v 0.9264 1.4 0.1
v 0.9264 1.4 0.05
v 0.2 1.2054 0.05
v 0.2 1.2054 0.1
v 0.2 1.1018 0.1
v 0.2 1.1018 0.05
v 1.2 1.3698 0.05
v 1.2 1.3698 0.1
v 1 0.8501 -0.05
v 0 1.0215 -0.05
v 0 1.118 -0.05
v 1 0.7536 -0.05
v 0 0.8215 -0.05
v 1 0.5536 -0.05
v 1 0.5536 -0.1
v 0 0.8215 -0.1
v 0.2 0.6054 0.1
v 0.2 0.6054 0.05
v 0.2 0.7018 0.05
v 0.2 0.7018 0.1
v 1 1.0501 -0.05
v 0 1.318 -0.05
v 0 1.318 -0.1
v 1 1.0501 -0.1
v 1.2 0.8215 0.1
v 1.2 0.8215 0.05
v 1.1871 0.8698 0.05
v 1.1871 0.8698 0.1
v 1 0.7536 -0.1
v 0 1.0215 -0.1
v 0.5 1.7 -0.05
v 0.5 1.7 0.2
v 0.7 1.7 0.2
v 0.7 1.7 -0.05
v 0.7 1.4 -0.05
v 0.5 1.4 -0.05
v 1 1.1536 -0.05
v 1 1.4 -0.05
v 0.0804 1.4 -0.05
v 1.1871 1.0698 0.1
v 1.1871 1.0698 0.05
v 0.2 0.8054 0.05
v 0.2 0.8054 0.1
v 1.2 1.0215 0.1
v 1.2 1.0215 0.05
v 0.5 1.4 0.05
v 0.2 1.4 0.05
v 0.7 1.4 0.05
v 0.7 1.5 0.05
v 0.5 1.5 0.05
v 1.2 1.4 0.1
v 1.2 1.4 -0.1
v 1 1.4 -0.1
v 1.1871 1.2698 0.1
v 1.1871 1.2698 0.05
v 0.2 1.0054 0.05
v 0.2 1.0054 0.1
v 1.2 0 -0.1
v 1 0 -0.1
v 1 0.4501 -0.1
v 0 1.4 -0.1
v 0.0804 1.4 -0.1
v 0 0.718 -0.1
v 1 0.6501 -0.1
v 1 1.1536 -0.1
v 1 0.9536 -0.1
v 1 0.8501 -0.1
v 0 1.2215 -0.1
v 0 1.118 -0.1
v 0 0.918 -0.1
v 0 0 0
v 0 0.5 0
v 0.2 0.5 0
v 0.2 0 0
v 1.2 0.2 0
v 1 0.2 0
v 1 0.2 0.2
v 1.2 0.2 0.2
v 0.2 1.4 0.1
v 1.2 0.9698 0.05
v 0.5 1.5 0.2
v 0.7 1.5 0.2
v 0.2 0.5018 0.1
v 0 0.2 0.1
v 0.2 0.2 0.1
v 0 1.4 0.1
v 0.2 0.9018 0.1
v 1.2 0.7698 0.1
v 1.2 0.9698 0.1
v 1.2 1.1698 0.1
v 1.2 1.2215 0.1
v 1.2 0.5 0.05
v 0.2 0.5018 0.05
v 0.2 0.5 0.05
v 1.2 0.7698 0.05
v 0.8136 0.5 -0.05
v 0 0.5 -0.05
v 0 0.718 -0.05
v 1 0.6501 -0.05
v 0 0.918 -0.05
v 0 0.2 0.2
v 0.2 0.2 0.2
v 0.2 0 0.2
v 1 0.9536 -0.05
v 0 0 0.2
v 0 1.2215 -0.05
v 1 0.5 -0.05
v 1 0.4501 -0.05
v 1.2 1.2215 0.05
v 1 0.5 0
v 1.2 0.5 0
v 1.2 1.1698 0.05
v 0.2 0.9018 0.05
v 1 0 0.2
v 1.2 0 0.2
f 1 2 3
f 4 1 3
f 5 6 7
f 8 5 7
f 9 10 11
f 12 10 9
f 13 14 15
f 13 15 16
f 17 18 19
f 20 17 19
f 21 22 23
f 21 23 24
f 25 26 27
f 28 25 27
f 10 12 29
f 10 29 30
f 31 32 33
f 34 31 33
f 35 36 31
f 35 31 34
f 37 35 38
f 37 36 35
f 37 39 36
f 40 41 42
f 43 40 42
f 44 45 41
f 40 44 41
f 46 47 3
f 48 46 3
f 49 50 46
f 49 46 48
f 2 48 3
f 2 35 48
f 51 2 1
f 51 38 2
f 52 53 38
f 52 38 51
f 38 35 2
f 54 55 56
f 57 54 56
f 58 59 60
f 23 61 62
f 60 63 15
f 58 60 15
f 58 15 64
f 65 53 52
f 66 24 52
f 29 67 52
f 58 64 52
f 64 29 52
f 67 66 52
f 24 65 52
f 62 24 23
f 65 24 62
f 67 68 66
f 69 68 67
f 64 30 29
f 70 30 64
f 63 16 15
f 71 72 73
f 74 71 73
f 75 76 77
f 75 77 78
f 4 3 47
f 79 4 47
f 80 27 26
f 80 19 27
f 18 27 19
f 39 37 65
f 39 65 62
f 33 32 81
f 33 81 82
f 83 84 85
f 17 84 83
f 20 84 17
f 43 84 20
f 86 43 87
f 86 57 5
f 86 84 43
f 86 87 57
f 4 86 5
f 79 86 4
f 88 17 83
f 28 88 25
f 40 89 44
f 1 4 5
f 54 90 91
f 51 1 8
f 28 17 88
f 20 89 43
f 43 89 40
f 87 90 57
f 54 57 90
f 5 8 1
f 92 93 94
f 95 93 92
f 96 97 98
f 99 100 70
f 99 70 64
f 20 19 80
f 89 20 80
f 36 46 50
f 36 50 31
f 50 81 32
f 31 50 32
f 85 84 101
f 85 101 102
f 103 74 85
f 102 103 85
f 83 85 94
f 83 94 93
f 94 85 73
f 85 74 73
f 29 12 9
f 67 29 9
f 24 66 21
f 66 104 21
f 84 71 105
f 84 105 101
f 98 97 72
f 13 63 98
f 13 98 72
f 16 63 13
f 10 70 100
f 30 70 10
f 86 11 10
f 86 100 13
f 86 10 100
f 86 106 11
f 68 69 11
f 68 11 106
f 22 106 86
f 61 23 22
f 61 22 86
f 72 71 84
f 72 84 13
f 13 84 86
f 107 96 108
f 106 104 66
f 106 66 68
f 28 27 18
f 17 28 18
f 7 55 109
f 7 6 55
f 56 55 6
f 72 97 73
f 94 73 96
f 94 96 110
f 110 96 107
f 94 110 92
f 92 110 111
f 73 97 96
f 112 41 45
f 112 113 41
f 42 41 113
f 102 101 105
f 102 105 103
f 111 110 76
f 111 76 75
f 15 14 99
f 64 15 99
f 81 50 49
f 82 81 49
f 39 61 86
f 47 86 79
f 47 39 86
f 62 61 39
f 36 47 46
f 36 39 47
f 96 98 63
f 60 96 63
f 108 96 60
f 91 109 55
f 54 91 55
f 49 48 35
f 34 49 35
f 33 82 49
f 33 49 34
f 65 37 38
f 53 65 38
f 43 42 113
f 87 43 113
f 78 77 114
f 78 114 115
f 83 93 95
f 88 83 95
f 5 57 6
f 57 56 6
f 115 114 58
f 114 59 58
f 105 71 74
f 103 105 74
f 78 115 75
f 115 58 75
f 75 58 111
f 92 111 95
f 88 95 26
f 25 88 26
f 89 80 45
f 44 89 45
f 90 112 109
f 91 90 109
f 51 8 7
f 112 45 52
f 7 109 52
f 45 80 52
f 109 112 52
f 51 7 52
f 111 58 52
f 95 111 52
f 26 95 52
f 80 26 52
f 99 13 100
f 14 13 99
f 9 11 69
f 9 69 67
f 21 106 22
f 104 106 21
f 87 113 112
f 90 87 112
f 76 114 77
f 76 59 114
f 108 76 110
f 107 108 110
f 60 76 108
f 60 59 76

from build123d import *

# Parameters (mm, degrees)
BOSS_EXTRUDE1_DEPTH             = 0.05
BOSS_EXTRUDE1_DEPTH_BACK        = 0.05
SKETCH3_W                       = 1.2
SKETCH3_H                       = 0.9
BOSS_EXTRUDE2_REACH             = 3.845
SKETCH4_W                       = 0.2
SKETCH4_H                       = 0.3
BOSS_EXTRUDE2_DIRECTION_2_REACH = 3.845
EXTRUDE_THIN1_DEPTH             = 0.05
EXTRUDE_THIN2_DEPTH             = 0.05
LPATTERN1_COUNT                 = 4
LPATTERN1_PITCH                 = 0.2
CUT_EXTRUDE1_DEPTH              = 3.093734881
CUT_EXTRUDE1_DEPTH_BACK         = 3.093734881
SKETCH8_W                       = 0.2
SKETCH8_H                       = 1.4
BOSS_EXTRUDE3_DEPTH             = 0.1
SKETCH9_W                       = 0.2
SKETCH9_H                       = 1.4
BOSS_EXTRUDE4_DEPTH             = 0.1
SKETCH10_W                      = 0.2
SKETCH10_H                      = 0.2
BOSS_EXTRUDE5_DEPTH             = 0.2
SKETCH11_W                      = 0.2
SKETCH11_H                      = 0.2
BOSS_EXTRUDE6_DEPTH             = 0.2


with BuildPart() as part:
    # Sketch3 → Boss-Extrude1 (new, two sides: drawn at the far end of the back side and taken through both)
    with BuildSketch(Plane.XY.offset(-BOSS_EXTRUDE1_DEPTH_BACK)):
        with Locations((0.6, 0.95)):
            Rectangle(SKETCH3_W, SKETCH3_H)
    extrude(amount=BOSS_EXTRUDE1_DEPTH + BOSS_EXTRUDE1_DEPTH_BACK)

    # Boss-Extrude2: up to this face of the body (flat: up to its plane)
    boss_extrude2_end = Plane(part.part.faces().sort_by_distance((0.6, 0.95, 0.05))[0])
    # Sketch4 → Boss-Extrude2 (add, up to the picked face)
    with BuildSketch(Plane.XY, mode=Mode.PRIVATE) as boss_extrude2_sk1:
        with Locations((0.6, 1.55)):
            Rectangle(SKETCH4_W, SKETCH4_H)
    boss_extrude2_tool1 = split(extrude(boss_extrude2_sk1.sketch, amount=BOSS_EXTRUDE2_REACH, mode=Mode.PRIVATE), bisect_by=boss_extrude2_end, keep=Keep.BOTH, mode=Mode.PRIVATE)
    add(boss_extrude2_tool1.solids().sort_by(Axis((0.6, 1.55, 0), (0, 0, 1)))[0])

    # Boss-Extrude2 direction 2: up to this face of the body (flat: up to its plane)
    boss_extrude2_direction_2_end = Plane(part.part.faces().sort_by_distance((0.6, 0.95, -0.05))[0])
    # Sketch4 → Boss-Extrude2 direction 2 (add, up to the picked face)
    with BuildSketch(Plane.XY, mode=Mode.PRIVATE) as boss_extrude2_direction_2_sk1:
        with Locations((0.6, 1.55)):
            Rectangle(SKETCH4_W, SKETCH4_H)
    boss_extrude2_direction_2_tool1 = split(extrude(boss_extrude2_direction_2_sk1.sketch, amount=-BOSS_EXTRUDE2_DIRECTION_2_REACH, mode=Mode.PRIVATE), bisect_by=boss_extrude2_direction_2_end, keep=Keep.BOTH, mode=Mode.PRIVATE)
    add(boss_extrude2_direction_2_tool1.solids().sort_by(Axis((0.6, 1.55, 0), (0, 0, -1)))[0])

    # Sketch5 → Extrude-Thin1 (add)
    with BuildSketch(Plane.XY.offset(0.05)):
        Polygon((0.012940952, 0.451703709), (1.212940952, 0.77324274), (1.187059048, 0.869835322), (-0.012940952, 0.548296291), align=None)
    extrude_thin1 = extrude(amount=EXTRUDE_THIN1_DEPTH)

    # Sketch6 → Extrude-Thin2 (add)
    with BuildSketch(Plane(origin=(0, 0, -0.05), x_dir=(-1, 0, 0), z_dir=(0, 0, -1))):
        Polygon((-1.2, 0.5), (0, 0.821539031), (0.025881905, 0.724946448), (-1.174118095, 0.403407417), align=None)
    extrude_thin2 = extrude(amount=EXTRUDE_THIN2_DEPTH)

    # LPattern1: Extrude-Thin1, Extrude-Thin2 ×4
    with Locations(*[(0, i * LPATTERN1_PITCH, 0) for i in range(1, LPATTERN1_COUNT)]):
        add(extrude_thin1)
        add(extrude_thin2)

    # Sketch7 → Cut-Extrude1 (cut, two sides: drawn at the far end of the back side and taken through both)
    with BuildSketch(Plane.XY.offset(0.05).offset(-CUT_EXTRUDE1_DEPTH_BACK)):
        Polygon((0.5, 1.7), (0.5, 1.4), (0, 1.4), (0, 0.5), (0, 0.2), (-0.1, 0.2), (-0.1, 1.7), align=None)
        Polygon((1.2, 1.4), (1.2, 0.5), (1.2, 0.2), (1.3, 0.2), (1.3, 1.7), (0.7, 1.7), (0.7, 1.4), align=None)
    extrude(amount=CUT_EXTRUDE1_DEPTH + CUT_EXTRUDE1_DEPTH_BACK, mode=Mode.SUBTRACT)

    # Sketch8 → Boss-Extrude3 (add)
    with BuildSketch(Plane.XY):
        with Locations((0.1, 0.7)):
            Rectangle(SKETCH8_W, SKETCH8_H)
    extrude(amount=BOSS_EXTRUDE3_DEPTH)

    # Sketch9 → Boss-Extrude4 (add)
    with BuildSketch(Plane.XY):
        with Locations((1.1, 0.7)):
            Rectangle(SKETCH9_W, SKETCH9_H)
    extrude(amount=-BOSS_EXTRUDE4_DEPTH)

    # Sketch10 → Boss-Extrude5 (add)
    with BuildSketch(Plane.XY):
        with Locations((1.1, 0.1)):
            Rectangle(SKETCH10_W, SKETCH10_H)
        with Locations((0.1, 0.1)):
            Rectangle(SKETCH10_W, SKETCH10_H)
    extrude(amount=BOSS_EXTRUDE5_DEPTH)

    # Sketch11 → Boss-Extrude6 (add)
    with BuildSketch(Plane.XY):
        with Locations((0.6, 1.6)):
            Rectangle(SKETCH11_W, SKETCH11_H)
    extrude(amount=BOSS_EXTRUDE6_DEPTH)


solid = part.part
